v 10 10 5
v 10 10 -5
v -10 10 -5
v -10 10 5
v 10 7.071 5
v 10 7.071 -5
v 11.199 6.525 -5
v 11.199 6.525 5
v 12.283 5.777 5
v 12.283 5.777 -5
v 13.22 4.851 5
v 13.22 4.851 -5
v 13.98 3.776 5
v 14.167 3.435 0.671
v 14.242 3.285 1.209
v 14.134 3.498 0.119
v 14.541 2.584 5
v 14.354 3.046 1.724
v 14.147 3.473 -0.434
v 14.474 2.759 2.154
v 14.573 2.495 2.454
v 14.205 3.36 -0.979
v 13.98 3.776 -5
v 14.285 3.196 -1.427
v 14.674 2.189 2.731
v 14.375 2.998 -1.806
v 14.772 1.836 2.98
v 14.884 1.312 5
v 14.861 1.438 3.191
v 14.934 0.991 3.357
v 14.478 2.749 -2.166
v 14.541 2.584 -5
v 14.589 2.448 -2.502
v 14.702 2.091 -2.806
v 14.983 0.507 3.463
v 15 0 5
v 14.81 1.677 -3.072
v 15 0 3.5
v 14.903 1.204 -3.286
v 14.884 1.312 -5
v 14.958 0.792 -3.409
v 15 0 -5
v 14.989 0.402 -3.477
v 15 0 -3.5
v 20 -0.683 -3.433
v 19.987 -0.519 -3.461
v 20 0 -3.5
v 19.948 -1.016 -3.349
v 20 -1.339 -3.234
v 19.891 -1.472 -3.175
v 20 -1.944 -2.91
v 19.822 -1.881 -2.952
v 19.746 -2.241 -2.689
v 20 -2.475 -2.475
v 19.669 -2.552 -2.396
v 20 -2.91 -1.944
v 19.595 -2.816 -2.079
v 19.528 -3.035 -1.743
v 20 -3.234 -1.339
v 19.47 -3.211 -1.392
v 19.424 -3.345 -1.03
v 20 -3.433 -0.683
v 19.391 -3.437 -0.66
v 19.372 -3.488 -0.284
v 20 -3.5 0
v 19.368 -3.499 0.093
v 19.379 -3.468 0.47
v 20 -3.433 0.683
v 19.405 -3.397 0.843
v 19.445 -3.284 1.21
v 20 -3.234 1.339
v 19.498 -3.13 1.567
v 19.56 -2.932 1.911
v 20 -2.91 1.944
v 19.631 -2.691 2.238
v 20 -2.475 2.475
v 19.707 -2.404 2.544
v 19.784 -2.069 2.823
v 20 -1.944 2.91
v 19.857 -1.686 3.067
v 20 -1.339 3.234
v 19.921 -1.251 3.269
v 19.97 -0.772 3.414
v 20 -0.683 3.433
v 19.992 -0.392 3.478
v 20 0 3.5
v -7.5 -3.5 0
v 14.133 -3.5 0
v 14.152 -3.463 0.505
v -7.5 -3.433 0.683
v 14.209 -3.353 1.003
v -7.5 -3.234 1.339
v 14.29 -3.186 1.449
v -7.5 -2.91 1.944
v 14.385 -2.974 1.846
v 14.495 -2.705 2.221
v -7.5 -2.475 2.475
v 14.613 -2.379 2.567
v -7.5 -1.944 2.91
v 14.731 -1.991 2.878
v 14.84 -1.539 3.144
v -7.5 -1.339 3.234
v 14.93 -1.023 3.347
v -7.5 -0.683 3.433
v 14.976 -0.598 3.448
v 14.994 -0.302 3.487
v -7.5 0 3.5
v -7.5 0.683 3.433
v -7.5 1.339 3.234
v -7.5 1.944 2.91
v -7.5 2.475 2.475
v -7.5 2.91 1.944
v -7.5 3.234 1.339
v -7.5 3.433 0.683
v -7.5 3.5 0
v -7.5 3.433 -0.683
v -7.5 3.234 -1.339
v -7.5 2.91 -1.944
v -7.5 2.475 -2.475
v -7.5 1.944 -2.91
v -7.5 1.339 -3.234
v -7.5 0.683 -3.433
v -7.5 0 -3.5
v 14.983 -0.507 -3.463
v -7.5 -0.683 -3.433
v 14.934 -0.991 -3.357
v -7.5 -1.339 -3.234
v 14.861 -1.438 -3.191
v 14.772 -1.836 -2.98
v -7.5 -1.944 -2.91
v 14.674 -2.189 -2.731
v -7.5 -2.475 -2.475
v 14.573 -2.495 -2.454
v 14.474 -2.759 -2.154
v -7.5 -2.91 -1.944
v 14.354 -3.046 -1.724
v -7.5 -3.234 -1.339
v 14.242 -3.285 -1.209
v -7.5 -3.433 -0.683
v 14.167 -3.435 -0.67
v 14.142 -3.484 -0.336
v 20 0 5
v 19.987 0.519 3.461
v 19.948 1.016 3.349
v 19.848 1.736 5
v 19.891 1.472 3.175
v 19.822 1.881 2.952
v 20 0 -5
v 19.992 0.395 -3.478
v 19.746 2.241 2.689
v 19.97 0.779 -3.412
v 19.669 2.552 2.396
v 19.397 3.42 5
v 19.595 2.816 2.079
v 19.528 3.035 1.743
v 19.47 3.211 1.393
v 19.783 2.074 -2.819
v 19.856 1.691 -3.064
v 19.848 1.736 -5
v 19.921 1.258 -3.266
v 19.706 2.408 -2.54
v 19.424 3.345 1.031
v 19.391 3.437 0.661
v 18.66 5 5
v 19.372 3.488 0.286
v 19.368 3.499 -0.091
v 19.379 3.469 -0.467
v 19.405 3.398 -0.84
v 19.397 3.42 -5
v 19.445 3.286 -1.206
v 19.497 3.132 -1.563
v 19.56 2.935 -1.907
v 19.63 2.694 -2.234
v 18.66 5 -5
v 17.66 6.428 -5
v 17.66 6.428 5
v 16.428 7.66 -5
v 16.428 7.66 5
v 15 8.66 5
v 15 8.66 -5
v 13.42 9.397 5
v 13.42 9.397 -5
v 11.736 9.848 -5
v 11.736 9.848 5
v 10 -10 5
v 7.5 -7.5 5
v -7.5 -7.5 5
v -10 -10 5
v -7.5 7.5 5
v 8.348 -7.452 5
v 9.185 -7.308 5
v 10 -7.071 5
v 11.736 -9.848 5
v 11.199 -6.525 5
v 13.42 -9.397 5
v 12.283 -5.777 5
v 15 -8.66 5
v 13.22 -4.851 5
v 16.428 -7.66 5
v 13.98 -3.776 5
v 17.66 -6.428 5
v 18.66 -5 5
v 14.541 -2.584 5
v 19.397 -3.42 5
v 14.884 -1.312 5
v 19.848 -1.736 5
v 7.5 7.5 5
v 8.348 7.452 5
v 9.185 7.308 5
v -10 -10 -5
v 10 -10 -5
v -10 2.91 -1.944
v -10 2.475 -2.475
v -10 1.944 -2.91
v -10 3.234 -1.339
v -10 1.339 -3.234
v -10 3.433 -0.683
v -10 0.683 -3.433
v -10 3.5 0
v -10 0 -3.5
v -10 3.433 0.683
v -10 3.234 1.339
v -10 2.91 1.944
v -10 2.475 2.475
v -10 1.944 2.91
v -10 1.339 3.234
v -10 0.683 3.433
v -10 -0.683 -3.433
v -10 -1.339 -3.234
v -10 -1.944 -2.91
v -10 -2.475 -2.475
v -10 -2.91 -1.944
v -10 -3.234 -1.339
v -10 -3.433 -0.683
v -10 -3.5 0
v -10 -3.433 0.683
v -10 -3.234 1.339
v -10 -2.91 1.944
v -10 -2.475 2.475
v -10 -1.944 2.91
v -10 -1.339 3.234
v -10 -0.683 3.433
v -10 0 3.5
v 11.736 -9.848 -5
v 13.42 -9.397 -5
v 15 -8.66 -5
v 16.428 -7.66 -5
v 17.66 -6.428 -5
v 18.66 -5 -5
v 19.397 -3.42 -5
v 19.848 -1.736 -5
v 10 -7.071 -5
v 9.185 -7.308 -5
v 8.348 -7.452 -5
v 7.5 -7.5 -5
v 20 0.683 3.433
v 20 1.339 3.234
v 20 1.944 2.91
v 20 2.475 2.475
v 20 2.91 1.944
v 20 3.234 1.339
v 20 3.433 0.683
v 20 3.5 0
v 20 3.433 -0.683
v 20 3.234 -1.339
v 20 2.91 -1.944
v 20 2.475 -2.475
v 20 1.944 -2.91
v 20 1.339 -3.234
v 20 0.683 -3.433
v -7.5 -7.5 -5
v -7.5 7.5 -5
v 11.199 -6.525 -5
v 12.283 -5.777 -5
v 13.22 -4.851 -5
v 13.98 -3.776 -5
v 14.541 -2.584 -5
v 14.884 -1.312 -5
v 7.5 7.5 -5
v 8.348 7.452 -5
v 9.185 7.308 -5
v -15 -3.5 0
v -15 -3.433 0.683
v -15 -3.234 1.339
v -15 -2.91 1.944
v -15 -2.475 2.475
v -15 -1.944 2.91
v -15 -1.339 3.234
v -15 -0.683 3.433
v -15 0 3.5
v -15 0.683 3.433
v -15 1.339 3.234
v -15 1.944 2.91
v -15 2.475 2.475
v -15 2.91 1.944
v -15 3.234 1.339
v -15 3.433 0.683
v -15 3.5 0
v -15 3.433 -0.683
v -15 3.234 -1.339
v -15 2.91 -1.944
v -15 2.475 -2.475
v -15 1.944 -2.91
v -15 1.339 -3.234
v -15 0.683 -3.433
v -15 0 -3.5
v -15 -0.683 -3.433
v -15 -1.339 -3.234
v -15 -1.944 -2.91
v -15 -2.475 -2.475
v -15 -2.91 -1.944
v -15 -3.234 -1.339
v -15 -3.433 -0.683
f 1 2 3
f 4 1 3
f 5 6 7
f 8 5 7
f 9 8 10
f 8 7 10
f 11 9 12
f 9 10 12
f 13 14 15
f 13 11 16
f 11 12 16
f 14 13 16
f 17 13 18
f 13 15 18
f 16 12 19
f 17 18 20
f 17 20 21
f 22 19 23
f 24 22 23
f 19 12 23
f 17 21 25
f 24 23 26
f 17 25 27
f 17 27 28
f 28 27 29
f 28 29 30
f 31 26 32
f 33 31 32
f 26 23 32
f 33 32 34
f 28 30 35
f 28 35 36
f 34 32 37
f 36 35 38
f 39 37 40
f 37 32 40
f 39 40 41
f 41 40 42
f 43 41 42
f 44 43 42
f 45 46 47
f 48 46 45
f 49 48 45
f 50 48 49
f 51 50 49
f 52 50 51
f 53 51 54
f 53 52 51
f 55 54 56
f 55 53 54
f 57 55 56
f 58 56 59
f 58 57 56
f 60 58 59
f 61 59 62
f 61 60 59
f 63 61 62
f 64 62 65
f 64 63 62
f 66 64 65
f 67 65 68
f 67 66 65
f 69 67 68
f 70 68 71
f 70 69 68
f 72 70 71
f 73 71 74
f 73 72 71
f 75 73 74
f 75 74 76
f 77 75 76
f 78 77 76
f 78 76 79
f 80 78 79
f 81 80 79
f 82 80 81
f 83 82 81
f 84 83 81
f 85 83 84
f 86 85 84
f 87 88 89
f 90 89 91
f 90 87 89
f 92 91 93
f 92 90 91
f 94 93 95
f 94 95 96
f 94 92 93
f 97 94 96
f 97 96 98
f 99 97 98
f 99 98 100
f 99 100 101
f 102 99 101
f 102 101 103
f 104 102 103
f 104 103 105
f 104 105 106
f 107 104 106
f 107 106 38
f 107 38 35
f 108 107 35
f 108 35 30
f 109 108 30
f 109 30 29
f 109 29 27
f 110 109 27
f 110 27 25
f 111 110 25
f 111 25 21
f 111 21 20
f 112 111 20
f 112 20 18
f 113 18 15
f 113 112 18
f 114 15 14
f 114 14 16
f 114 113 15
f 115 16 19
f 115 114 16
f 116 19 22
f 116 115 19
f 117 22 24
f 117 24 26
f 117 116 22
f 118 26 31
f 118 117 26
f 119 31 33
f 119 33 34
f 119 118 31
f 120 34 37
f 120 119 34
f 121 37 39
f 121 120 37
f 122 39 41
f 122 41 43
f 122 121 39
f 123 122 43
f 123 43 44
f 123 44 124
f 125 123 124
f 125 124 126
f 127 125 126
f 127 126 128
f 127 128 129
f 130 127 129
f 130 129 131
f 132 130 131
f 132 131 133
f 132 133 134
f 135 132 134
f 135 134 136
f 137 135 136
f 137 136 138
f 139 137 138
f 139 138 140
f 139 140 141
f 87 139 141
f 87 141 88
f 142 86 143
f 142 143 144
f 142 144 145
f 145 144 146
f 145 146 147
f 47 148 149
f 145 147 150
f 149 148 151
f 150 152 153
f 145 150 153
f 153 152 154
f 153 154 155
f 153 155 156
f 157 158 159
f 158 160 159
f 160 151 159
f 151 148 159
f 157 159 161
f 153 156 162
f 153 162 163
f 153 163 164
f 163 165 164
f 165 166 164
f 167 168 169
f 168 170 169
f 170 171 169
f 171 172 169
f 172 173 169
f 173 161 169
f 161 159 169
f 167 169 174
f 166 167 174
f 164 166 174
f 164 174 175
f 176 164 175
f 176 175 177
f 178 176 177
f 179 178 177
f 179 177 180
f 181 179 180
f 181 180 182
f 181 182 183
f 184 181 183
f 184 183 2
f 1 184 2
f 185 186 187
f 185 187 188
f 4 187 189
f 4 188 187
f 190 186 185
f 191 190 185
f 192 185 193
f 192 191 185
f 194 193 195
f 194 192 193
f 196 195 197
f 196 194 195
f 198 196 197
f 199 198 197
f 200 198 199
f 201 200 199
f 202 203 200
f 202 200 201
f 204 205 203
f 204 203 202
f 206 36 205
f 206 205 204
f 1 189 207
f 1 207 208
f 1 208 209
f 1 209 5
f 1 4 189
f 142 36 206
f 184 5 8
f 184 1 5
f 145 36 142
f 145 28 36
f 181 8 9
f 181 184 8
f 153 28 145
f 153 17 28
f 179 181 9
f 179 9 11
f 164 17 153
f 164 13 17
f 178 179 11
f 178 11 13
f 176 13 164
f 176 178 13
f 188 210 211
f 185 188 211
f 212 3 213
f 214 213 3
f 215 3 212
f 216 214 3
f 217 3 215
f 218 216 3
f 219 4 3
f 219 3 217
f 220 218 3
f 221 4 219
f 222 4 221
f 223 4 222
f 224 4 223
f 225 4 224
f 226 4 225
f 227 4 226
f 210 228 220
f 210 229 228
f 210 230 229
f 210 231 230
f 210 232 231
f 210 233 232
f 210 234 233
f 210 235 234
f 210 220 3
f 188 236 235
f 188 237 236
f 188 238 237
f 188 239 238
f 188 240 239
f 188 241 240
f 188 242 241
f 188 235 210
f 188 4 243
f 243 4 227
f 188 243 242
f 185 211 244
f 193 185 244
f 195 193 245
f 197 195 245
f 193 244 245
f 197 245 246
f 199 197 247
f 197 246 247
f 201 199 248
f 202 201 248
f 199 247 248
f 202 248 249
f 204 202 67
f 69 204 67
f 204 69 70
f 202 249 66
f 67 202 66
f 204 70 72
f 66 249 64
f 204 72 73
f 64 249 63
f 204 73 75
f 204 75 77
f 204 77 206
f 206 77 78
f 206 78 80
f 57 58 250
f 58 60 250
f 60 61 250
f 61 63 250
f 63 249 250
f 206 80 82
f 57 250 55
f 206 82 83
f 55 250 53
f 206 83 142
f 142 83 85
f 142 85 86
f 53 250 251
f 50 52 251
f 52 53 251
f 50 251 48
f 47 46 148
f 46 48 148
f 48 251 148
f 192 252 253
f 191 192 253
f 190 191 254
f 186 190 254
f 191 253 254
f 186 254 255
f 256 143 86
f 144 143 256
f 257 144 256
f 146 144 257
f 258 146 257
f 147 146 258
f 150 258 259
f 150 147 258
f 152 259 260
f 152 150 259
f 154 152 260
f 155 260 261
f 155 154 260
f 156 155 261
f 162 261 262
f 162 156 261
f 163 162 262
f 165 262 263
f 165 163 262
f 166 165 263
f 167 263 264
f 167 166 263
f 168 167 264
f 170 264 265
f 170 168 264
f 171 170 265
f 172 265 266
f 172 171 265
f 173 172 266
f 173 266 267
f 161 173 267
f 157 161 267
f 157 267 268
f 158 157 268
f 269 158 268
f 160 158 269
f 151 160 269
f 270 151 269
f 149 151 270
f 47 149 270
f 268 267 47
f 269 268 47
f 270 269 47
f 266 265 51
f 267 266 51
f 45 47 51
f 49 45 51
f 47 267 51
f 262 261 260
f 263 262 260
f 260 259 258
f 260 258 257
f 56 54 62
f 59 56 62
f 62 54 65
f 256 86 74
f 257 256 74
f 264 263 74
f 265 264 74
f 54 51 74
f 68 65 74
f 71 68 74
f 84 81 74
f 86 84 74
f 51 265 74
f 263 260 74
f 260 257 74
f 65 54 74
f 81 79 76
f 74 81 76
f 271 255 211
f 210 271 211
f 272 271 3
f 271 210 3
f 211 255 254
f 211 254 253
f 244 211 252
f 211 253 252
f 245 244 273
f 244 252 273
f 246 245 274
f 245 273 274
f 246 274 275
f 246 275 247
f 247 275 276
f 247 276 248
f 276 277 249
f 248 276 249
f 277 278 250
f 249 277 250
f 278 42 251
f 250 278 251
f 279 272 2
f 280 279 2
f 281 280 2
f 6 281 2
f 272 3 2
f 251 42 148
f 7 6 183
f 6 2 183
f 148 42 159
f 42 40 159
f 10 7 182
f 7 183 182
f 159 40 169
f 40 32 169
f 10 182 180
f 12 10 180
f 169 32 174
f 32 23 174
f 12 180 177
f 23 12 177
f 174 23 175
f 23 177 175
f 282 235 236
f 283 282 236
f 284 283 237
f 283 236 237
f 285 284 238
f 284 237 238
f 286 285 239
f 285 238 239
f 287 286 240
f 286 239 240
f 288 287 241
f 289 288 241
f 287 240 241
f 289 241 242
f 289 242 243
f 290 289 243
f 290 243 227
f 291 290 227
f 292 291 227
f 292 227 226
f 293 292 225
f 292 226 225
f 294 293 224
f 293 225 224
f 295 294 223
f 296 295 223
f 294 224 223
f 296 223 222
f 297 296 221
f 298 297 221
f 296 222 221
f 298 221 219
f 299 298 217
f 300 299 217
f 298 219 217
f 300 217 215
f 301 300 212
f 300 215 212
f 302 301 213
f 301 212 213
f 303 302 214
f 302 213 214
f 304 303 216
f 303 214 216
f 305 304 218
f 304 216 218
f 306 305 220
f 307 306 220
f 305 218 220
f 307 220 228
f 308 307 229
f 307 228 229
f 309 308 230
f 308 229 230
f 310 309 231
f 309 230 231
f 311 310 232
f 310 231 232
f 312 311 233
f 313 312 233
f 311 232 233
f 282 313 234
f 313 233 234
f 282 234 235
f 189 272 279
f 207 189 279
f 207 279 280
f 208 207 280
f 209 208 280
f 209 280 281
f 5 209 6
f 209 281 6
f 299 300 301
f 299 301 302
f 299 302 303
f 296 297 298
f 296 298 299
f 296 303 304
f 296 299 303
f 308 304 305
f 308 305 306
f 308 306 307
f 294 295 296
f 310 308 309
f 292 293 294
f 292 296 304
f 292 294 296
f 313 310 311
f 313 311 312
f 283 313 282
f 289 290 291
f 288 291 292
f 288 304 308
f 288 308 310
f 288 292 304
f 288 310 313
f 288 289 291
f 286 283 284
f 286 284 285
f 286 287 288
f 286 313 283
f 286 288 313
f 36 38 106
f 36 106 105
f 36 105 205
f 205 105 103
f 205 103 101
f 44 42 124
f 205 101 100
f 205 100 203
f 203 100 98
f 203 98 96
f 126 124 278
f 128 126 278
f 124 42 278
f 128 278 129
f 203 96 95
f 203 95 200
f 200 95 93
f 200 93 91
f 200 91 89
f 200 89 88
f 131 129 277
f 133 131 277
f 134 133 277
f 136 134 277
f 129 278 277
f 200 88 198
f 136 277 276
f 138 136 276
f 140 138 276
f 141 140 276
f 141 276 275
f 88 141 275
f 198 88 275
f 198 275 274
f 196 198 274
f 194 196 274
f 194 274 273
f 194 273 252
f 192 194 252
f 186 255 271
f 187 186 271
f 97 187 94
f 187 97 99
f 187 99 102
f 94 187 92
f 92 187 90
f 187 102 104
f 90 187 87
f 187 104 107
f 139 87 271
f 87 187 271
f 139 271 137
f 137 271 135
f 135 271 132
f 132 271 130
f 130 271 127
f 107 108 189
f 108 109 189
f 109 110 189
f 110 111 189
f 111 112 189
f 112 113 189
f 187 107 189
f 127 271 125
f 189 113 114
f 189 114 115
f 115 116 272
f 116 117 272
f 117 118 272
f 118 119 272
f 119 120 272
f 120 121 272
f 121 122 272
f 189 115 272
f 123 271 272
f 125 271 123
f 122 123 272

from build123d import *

# Parameters (mm, degrees)
F1_DEPTH      = 10
F3_R          = 3.5
F4_DEPTH      = 30
F4_DEPTH_BACK = 5


with BuildPart() as f1:
    # F0 (on Top) → F1 (new body)
    with BuildSketch(Plane.XY):
        with BuildLine():
            ThreePointArc((3.3856217223, 7.5), (6.4644660941, 9.3541434669), (10, 10))
            Line((10, 10), (-10, 10))
            Line((-10, 10), (-10, -10))
            Line((-10, -10), (10, -10))
            ThreePointArc((10, -10), (6.4644660941, -9.3541434669), (3.3856217223, -7.5))
            Line((3.3856217223, -7.5), (-7.5, -7.5))
            Line((-7.5, -7.5), (-7.5, 7.5))
            Line((-7.5, 7.5), (3.3856217223, 7.5))
        make_face()
        with BuildLine():
            ThreePointArc((20, 0), (17.0710678119, 7.0710678119), (10, 10))
            Line((10, 10), (10, 7.0710678119))
            ThreePointArc((10, 7.0710678119), (13.623724357, 4.3301270189), (15, 0))
            ThreePointArc((15, 0), (13.623724357, -4.3301270189), (10, -7.0710678119))
            Line((10, -7.0710678119), (10, -10))
            ThreePointArc((10, -10), (17.0710678119, -7.0710678119), (20, 0))
        make_face()
        with BuildLine():
            Line((10, 7.0710678119), (10, 10))
            ThreePointArc((10, 10), (6.4644660941, 9.3541434669), (3.3856217223, 7.5))
            Line((3.3856217223, 7.5), (7.5, 7.5))
            ThreePointArc((7.5, 7.5), (8.7682648404, 7.3919891974), (10, 7.0710678119))
        make_face()
        with BuildLine():
            Line((10, -10), (10, -7.0710678119))
            ThreePointArc((10, -7.0710678119), (8.7682648404, -7.3919891974), (7.5, -7.5))
            Line((7.5, -7.5), (3.3856217223, -7.5))
            ThreePointArc((3.3856217223, -7.5), (6.4644660941, -9.3541434669), (10, -10))
        make_face()
    extrude(amount=F1_DEPTH)


with BuildPart() as f1_1:
    # F2: moved
    add(f1.part.moved(Location((0, 0, -5))))

    # F3 (on face) → F4 (join, two sides)
    with BuildSketch(Plane(origin=(-10, 0, 0), x_dir=(0, -1, 0), z_dir=(-1, 0, 0))) as f4_sk:
        Circle(F3_R)
    extrude(amount=-F4_DEPTH)
    extrude(f4_sk.sketch, amount=F4_DEPTH_BACK)


solid = f1_1.part
